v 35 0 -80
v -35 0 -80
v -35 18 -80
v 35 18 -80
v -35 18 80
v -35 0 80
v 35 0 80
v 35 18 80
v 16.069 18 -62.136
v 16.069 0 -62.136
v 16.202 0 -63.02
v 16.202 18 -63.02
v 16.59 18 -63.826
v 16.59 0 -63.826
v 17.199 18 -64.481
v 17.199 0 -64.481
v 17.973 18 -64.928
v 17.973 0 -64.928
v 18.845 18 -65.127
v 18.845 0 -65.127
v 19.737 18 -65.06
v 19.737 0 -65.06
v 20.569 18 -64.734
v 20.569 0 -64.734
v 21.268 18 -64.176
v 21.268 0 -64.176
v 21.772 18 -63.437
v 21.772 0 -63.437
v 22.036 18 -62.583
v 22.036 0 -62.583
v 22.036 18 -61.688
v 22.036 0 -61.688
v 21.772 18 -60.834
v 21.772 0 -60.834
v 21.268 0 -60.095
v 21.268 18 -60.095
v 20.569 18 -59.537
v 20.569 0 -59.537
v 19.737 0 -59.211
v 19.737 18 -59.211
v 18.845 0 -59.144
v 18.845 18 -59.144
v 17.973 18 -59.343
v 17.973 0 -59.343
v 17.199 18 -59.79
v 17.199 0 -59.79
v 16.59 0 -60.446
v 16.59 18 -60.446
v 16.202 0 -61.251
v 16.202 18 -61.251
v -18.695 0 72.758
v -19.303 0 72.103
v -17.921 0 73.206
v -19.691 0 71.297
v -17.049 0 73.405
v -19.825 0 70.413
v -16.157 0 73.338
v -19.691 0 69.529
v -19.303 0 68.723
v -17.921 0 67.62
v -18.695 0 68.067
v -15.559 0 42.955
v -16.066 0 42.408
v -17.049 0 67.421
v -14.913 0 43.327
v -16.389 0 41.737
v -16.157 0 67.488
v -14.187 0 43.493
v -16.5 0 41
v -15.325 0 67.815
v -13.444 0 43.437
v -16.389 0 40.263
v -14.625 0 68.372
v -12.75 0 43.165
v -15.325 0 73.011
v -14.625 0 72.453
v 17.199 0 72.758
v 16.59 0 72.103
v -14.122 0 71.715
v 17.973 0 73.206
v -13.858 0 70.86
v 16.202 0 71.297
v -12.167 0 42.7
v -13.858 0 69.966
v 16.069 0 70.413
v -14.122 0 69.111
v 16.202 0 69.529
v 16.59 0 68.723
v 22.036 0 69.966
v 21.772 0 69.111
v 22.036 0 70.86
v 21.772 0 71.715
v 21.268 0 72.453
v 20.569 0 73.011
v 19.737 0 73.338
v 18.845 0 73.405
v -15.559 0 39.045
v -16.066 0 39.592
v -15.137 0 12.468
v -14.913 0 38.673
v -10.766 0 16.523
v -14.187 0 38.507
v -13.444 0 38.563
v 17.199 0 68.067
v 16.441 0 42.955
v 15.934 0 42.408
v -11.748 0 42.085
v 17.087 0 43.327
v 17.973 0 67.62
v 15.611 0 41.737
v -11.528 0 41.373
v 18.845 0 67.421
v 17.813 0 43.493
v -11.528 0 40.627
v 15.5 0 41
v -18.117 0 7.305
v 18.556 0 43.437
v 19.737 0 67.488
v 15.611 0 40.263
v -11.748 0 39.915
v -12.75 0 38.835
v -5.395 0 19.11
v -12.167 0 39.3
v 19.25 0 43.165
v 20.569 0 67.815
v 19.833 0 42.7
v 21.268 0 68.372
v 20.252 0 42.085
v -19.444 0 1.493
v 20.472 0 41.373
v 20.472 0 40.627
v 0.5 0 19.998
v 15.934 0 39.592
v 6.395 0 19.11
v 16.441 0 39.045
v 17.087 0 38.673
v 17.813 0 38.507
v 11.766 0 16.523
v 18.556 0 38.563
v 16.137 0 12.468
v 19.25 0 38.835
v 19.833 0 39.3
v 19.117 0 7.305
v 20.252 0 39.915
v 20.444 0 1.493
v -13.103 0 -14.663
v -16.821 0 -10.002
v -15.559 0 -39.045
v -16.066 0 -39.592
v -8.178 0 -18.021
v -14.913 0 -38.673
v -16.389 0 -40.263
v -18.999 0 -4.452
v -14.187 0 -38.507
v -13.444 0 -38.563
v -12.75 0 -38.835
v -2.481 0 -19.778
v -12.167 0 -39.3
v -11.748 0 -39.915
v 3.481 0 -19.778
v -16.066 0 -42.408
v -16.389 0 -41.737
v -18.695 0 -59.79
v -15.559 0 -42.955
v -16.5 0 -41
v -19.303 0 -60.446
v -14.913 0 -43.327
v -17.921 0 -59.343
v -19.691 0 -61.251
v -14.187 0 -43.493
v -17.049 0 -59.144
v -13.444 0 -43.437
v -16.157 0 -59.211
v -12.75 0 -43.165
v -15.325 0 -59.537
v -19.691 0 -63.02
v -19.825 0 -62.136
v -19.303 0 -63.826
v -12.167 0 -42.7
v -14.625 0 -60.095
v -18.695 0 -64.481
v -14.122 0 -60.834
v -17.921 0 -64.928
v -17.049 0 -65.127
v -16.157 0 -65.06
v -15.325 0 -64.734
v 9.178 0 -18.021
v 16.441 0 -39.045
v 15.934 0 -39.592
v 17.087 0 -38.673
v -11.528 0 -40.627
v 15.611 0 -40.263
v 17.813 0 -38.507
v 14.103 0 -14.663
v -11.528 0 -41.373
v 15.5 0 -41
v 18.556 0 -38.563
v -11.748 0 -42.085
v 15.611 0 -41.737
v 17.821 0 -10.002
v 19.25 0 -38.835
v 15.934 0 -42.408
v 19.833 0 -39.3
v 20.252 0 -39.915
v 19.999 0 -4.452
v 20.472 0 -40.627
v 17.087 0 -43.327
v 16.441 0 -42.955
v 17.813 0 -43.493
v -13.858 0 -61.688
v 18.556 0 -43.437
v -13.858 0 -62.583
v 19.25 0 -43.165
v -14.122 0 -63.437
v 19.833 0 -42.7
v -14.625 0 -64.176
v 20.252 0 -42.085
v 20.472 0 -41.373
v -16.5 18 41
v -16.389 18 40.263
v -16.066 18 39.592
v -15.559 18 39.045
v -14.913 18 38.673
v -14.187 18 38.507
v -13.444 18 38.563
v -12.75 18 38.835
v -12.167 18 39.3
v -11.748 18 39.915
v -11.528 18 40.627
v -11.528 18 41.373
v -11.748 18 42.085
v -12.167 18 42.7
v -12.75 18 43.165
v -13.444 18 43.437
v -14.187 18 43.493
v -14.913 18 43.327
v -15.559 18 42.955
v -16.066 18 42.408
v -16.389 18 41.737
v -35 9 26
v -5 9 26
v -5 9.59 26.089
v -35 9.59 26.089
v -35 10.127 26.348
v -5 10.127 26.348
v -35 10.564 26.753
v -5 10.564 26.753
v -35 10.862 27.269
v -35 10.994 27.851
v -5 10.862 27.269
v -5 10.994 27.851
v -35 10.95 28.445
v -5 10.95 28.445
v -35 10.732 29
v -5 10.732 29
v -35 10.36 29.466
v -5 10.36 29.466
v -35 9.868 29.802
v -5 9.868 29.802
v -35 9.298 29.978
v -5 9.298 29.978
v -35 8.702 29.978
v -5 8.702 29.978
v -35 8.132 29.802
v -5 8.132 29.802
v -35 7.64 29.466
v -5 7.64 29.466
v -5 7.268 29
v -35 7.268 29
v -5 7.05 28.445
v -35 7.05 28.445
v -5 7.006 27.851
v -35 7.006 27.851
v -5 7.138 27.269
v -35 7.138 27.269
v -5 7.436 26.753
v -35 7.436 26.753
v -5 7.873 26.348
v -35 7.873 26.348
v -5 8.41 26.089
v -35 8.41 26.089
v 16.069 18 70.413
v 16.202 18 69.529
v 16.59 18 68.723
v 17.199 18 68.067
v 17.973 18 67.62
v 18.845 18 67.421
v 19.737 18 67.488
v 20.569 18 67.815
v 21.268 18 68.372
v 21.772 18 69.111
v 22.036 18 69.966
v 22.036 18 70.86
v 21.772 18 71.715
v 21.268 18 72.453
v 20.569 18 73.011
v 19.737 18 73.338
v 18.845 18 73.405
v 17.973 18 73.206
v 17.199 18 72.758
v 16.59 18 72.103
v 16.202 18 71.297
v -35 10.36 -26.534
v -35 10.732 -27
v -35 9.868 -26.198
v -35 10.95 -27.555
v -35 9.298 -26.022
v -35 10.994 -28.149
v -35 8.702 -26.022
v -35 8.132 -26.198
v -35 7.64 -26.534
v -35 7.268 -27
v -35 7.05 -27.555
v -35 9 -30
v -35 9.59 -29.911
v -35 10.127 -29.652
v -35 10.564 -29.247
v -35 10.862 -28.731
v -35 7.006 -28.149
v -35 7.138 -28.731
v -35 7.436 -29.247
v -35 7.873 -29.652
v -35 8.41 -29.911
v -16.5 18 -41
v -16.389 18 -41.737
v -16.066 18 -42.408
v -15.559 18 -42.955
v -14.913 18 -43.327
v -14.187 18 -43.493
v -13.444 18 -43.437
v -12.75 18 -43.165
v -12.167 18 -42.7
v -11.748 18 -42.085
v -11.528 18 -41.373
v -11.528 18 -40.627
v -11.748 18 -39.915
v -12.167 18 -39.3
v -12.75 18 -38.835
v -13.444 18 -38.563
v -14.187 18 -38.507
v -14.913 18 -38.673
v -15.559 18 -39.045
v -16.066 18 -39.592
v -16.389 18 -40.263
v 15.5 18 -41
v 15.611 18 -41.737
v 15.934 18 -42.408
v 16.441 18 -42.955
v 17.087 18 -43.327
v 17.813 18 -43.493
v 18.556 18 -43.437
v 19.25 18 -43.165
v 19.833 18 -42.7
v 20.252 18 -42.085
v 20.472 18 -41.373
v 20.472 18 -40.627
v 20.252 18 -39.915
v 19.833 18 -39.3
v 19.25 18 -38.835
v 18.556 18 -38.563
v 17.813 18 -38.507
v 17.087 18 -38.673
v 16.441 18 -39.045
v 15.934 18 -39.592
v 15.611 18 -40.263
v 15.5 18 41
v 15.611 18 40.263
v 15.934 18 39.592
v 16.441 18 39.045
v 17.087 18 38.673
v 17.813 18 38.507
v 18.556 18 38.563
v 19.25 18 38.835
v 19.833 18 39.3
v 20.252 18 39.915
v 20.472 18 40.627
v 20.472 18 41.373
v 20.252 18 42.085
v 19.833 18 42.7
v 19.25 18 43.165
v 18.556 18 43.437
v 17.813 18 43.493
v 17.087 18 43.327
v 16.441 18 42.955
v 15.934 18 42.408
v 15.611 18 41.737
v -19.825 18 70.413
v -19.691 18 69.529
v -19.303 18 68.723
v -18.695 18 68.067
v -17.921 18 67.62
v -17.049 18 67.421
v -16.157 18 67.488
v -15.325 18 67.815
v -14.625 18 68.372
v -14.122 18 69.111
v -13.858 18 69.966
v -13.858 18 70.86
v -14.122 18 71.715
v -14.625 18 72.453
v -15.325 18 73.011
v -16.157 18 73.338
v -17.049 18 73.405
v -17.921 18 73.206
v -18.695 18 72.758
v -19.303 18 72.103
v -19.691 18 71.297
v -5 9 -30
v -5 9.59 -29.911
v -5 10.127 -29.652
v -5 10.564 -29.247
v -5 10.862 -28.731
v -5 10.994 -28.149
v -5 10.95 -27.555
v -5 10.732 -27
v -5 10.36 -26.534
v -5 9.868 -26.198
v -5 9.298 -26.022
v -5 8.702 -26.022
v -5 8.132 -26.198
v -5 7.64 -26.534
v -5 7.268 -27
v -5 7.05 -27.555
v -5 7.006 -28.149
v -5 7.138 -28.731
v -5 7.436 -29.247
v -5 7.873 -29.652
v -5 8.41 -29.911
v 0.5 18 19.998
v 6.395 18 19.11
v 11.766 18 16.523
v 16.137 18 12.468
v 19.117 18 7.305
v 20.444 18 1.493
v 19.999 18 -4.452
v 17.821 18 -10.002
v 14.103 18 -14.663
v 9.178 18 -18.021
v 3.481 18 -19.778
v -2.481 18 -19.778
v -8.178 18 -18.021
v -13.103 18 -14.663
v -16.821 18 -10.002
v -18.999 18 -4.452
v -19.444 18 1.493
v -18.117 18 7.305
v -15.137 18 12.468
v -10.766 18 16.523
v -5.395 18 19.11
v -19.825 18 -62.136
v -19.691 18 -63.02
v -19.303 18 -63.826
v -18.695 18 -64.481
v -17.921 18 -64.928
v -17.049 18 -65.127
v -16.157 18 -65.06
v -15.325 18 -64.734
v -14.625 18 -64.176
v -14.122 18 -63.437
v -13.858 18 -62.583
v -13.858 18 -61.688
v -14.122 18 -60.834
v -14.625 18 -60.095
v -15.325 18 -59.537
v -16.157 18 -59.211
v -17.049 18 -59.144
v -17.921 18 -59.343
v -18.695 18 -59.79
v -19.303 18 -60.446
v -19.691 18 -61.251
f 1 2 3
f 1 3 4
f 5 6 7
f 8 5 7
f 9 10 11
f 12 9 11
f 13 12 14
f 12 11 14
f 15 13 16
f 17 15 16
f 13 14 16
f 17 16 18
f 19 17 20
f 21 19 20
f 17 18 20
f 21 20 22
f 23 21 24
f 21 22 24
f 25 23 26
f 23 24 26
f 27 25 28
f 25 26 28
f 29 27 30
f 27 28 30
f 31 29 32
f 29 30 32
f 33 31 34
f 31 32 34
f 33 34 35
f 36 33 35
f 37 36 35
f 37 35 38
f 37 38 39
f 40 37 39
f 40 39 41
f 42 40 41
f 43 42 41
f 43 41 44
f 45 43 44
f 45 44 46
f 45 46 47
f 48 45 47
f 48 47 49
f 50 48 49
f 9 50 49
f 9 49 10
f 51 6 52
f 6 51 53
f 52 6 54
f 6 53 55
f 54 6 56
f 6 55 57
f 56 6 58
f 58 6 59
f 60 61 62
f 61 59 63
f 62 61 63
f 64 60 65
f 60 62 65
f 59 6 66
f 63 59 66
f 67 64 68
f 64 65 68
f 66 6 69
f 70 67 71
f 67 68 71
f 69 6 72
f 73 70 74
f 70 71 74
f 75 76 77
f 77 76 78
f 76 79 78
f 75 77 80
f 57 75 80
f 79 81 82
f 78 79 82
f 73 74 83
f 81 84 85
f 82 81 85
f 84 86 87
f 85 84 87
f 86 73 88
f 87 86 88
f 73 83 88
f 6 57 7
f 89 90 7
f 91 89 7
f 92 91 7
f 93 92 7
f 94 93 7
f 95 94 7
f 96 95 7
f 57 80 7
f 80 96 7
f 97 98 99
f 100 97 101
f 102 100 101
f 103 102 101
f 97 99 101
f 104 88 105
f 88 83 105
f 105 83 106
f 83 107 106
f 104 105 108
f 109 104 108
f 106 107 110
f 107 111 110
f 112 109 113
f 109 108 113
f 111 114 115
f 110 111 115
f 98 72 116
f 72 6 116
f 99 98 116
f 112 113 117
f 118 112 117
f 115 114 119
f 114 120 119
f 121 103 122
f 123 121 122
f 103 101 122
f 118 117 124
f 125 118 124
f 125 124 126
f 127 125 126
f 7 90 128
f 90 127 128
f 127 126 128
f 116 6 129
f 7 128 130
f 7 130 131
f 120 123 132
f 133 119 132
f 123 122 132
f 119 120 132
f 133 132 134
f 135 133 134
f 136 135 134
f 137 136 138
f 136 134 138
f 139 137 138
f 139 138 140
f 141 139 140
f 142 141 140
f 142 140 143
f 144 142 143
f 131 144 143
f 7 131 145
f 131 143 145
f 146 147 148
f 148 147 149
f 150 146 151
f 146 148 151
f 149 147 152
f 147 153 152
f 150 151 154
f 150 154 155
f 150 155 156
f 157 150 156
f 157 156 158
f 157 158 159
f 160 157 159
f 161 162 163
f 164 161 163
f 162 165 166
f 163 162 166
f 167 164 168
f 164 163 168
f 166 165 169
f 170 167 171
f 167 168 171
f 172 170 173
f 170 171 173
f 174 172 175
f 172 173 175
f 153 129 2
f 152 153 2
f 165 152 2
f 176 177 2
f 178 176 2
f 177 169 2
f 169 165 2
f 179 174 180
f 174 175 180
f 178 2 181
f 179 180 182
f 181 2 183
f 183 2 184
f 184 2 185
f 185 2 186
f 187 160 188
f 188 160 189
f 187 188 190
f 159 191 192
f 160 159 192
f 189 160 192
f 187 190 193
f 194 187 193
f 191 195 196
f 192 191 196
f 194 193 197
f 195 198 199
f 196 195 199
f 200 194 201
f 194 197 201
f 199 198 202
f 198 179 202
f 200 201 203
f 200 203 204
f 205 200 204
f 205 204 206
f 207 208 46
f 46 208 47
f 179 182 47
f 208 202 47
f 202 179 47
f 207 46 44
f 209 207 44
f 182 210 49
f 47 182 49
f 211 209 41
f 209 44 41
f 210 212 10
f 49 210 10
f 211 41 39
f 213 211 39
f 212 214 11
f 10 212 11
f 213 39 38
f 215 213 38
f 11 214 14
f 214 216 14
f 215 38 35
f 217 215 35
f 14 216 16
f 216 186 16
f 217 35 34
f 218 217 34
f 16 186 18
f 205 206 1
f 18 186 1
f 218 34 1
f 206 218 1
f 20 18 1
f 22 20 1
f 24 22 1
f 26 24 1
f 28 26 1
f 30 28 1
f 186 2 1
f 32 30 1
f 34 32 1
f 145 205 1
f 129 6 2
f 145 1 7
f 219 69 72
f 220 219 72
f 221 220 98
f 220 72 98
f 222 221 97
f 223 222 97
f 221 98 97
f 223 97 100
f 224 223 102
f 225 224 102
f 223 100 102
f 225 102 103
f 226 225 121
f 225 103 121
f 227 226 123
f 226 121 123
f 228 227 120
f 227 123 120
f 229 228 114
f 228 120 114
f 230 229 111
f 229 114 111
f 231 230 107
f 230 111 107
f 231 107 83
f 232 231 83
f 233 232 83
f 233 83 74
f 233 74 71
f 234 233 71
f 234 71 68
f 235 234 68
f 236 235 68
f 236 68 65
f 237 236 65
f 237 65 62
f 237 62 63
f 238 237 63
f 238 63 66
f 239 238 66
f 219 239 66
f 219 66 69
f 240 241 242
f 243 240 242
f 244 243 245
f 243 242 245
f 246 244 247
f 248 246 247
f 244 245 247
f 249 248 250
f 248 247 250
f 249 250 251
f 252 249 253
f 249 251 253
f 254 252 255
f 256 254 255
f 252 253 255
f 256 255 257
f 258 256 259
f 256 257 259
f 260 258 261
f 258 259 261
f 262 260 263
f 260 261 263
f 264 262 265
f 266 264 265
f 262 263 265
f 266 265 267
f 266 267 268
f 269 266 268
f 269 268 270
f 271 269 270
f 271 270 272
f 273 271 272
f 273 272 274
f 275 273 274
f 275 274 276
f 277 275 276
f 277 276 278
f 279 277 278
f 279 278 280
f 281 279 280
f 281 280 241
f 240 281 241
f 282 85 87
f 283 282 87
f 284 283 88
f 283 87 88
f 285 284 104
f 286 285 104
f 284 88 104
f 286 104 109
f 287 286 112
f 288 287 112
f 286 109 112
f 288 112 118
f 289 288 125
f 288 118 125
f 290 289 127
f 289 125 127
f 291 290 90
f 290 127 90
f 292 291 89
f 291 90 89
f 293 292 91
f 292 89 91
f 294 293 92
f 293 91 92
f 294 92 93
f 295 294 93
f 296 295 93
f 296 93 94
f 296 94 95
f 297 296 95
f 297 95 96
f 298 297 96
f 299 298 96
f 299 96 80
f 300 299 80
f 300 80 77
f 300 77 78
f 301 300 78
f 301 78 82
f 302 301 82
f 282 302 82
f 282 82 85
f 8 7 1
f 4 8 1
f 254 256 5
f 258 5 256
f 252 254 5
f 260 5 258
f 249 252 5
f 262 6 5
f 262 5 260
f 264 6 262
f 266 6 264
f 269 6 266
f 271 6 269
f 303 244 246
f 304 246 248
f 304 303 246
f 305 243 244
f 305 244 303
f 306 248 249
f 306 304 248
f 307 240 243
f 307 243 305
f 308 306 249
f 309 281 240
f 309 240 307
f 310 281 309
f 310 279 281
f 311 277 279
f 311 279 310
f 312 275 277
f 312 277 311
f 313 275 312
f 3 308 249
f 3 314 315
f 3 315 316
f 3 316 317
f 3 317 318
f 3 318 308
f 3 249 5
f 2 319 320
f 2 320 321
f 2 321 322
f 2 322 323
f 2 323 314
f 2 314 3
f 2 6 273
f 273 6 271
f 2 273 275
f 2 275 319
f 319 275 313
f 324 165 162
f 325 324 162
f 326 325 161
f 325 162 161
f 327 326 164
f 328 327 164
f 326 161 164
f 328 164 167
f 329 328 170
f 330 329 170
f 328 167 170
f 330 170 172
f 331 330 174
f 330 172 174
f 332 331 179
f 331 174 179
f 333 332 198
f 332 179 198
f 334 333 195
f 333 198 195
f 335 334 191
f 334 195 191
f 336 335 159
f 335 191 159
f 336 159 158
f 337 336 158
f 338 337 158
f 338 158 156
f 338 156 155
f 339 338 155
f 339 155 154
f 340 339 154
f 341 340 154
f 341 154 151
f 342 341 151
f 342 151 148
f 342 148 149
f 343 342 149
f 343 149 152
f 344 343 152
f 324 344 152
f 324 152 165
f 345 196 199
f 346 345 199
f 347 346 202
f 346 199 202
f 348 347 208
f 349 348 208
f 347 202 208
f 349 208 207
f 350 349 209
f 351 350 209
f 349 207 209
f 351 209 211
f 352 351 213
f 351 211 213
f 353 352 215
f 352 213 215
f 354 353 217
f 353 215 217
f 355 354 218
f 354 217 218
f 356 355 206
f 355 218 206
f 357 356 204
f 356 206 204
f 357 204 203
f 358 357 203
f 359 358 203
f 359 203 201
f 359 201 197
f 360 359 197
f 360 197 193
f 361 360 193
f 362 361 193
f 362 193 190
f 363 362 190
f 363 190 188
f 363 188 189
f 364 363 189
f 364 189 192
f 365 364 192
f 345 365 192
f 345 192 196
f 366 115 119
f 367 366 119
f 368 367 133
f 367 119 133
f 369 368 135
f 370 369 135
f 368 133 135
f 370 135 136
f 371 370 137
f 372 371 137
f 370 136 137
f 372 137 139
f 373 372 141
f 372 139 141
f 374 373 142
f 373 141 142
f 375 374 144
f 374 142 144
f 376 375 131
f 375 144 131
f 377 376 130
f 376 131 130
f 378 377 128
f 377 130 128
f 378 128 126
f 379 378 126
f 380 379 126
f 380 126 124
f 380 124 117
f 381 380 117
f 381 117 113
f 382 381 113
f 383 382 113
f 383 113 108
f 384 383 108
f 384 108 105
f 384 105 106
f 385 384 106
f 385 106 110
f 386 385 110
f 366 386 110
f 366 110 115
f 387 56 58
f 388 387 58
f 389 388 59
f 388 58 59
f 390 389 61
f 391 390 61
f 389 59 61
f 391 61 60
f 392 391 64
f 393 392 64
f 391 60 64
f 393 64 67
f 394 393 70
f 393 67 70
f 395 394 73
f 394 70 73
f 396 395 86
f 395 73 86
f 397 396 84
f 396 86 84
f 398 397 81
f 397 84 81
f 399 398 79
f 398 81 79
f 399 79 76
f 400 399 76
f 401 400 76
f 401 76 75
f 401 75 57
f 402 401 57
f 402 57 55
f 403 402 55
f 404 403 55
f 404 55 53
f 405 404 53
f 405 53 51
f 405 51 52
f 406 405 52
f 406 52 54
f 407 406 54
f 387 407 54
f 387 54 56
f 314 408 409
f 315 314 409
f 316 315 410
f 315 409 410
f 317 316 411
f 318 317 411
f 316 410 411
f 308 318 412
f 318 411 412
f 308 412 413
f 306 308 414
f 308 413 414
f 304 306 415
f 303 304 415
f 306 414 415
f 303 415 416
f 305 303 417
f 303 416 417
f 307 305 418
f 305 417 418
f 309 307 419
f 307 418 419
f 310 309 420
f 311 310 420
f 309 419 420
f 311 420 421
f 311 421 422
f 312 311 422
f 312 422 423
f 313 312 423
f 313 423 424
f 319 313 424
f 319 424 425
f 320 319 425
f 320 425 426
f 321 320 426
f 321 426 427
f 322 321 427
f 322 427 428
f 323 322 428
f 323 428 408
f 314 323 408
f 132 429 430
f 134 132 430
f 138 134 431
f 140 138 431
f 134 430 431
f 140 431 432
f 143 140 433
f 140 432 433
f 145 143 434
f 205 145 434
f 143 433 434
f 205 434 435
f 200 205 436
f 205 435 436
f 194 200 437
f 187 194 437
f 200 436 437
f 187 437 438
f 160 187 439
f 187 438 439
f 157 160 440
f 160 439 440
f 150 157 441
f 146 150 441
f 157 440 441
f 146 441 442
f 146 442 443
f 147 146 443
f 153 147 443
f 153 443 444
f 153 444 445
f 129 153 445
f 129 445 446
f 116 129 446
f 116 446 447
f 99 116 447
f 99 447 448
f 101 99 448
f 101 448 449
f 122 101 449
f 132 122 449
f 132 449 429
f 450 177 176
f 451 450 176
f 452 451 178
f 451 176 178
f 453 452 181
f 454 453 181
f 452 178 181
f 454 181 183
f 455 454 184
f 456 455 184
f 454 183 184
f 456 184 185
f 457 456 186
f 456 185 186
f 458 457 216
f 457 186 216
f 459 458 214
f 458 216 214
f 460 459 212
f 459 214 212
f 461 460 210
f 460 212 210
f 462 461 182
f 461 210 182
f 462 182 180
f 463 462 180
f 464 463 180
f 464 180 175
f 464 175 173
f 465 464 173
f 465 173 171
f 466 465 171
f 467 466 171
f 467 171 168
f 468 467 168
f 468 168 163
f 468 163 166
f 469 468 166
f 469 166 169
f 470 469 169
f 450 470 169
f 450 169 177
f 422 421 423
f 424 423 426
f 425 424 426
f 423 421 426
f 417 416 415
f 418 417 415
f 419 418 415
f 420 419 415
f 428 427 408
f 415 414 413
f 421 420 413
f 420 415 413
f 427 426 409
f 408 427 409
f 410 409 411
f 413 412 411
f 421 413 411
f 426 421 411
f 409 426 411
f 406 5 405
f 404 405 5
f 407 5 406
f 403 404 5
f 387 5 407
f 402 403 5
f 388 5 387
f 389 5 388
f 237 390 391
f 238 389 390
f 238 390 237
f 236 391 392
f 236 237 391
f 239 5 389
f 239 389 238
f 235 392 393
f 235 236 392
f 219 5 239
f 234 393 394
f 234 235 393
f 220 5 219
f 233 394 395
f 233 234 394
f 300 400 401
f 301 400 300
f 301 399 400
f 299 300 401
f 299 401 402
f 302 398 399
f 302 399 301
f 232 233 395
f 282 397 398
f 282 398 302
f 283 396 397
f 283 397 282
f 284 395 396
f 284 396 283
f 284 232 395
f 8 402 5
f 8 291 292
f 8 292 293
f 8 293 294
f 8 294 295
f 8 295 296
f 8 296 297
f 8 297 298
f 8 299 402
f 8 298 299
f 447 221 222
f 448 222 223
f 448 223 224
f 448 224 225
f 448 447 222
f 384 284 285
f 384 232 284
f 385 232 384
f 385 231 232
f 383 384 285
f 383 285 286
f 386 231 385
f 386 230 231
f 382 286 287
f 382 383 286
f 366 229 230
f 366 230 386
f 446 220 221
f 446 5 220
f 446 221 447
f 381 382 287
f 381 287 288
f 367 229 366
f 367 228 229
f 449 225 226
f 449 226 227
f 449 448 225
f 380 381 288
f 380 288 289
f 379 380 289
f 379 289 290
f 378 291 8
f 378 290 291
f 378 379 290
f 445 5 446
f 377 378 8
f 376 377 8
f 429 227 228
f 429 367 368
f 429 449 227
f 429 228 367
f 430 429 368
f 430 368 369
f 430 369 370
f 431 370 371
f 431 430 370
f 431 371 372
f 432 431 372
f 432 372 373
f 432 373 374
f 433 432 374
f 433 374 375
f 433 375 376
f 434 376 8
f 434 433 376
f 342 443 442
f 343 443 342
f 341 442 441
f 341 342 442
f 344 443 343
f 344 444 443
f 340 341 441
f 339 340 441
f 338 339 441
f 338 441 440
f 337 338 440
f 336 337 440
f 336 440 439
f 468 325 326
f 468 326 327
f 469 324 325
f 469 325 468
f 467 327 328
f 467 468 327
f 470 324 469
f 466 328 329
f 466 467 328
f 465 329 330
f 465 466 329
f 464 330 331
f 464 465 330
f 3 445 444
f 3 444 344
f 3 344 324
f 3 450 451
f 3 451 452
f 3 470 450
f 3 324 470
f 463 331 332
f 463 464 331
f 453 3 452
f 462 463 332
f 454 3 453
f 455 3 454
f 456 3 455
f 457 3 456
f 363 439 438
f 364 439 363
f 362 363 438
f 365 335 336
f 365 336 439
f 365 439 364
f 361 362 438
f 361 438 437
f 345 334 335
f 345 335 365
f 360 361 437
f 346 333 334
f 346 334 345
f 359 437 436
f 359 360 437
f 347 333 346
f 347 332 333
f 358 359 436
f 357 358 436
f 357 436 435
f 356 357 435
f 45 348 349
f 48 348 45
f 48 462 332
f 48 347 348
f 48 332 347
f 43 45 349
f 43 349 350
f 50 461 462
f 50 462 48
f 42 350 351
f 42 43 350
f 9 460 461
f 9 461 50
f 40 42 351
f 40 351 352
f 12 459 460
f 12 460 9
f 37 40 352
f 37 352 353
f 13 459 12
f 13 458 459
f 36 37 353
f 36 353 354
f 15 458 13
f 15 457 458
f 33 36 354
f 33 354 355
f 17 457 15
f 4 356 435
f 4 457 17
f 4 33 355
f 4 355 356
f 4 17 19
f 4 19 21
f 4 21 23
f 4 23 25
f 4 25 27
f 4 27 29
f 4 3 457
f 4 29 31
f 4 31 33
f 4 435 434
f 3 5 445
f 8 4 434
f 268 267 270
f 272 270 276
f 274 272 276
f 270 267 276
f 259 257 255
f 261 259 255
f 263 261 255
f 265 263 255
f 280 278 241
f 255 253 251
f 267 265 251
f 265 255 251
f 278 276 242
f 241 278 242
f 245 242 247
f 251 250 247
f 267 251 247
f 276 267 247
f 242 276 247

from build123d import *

# Parameters (mm, degrees)
SKETCH1_W                    = 70
SKETCH1_H                    = 160
BOSS_EXTRUDE1_DEPTH          = 18
SKETCH2_R                    = 20
CUT_EXTRUDE1_DEPTH           = 90.157164603
F_6_0_6_DIAMETER_HOLE1_D     = 6
F_4_0_4_DIAMETER_HOLE1_D     = 4
F_4_0_4_DIAMETER_HOLE1_DEPTH = 30
F_5_0_5_DIAMETER_HOLE1_D     = 5


with BuildPart() as part:
    # Sketch1 → Boss-Extrude1 (new body)
    with BuildSketch(Plane(origin=(0, 0, 0), x_dir=(1, 0, 0), z_dir=(0, 1, 0))):
        Rectangle(SKETCH1_W, SKETCH1_H)
    extrude(amount=BOSS_EXTRUDE1_DEPTH)

    # Sketch2 → Cut-Extrude1 (cut, through all)
    with BuildSketch(Plane(origin=(0, 18, 0), x_dir=(1, 0, 0), z_dir=(0, 1, 0))):
        with Locations(Location((0.500000036, 0.001841312, 0), (0, 0, 270))):
            Circle(SKETCH2_R)
    extrude(amount=-CUT_EXTRUDE1_DEPTH, mode=Mode.SUBTRACT)

    # Ø6.0 (6) Diameter Hole1 (through all)
    with Locations(Plane(origin=(0, 18, 0), x_dir=(1, 0, 0), z_dir=(0, 1, 0))):
        with Locations((19.069096126, 62.135567862), (-16.824568918, 62.135567862), (19.069096126, -70.412962857), (-16.824568918, -70.412962857)):
            Hole(F_6_0_6_DIAMETER_HOLE1_D / 2)

    # Ø4.0 (4) Diameter Hole1
    with Locations(Plane.ZY.offset(35)):
        with Locations((28, 9), (-28, 9)):
            Hole(F_4_0_4_DIAMETER_HOLE1_D / 2, depth=F_4_0_4_DIAMETER_HOLE1_DEPTH)

    # Ø5.0 (5) Diameter Hole1 (through all)
    with Locations(Plane(origin=(0, 18, 0), x_dir=(1, 0, 0), z_dir=(0, 1, 0))):
        with Locations((18, 41), (-14, 41), (18, -41), (-14, -41)):
            Hole(F_5_0_5_DIAMETER_HOLE1_D / 2)


solid = part.part
